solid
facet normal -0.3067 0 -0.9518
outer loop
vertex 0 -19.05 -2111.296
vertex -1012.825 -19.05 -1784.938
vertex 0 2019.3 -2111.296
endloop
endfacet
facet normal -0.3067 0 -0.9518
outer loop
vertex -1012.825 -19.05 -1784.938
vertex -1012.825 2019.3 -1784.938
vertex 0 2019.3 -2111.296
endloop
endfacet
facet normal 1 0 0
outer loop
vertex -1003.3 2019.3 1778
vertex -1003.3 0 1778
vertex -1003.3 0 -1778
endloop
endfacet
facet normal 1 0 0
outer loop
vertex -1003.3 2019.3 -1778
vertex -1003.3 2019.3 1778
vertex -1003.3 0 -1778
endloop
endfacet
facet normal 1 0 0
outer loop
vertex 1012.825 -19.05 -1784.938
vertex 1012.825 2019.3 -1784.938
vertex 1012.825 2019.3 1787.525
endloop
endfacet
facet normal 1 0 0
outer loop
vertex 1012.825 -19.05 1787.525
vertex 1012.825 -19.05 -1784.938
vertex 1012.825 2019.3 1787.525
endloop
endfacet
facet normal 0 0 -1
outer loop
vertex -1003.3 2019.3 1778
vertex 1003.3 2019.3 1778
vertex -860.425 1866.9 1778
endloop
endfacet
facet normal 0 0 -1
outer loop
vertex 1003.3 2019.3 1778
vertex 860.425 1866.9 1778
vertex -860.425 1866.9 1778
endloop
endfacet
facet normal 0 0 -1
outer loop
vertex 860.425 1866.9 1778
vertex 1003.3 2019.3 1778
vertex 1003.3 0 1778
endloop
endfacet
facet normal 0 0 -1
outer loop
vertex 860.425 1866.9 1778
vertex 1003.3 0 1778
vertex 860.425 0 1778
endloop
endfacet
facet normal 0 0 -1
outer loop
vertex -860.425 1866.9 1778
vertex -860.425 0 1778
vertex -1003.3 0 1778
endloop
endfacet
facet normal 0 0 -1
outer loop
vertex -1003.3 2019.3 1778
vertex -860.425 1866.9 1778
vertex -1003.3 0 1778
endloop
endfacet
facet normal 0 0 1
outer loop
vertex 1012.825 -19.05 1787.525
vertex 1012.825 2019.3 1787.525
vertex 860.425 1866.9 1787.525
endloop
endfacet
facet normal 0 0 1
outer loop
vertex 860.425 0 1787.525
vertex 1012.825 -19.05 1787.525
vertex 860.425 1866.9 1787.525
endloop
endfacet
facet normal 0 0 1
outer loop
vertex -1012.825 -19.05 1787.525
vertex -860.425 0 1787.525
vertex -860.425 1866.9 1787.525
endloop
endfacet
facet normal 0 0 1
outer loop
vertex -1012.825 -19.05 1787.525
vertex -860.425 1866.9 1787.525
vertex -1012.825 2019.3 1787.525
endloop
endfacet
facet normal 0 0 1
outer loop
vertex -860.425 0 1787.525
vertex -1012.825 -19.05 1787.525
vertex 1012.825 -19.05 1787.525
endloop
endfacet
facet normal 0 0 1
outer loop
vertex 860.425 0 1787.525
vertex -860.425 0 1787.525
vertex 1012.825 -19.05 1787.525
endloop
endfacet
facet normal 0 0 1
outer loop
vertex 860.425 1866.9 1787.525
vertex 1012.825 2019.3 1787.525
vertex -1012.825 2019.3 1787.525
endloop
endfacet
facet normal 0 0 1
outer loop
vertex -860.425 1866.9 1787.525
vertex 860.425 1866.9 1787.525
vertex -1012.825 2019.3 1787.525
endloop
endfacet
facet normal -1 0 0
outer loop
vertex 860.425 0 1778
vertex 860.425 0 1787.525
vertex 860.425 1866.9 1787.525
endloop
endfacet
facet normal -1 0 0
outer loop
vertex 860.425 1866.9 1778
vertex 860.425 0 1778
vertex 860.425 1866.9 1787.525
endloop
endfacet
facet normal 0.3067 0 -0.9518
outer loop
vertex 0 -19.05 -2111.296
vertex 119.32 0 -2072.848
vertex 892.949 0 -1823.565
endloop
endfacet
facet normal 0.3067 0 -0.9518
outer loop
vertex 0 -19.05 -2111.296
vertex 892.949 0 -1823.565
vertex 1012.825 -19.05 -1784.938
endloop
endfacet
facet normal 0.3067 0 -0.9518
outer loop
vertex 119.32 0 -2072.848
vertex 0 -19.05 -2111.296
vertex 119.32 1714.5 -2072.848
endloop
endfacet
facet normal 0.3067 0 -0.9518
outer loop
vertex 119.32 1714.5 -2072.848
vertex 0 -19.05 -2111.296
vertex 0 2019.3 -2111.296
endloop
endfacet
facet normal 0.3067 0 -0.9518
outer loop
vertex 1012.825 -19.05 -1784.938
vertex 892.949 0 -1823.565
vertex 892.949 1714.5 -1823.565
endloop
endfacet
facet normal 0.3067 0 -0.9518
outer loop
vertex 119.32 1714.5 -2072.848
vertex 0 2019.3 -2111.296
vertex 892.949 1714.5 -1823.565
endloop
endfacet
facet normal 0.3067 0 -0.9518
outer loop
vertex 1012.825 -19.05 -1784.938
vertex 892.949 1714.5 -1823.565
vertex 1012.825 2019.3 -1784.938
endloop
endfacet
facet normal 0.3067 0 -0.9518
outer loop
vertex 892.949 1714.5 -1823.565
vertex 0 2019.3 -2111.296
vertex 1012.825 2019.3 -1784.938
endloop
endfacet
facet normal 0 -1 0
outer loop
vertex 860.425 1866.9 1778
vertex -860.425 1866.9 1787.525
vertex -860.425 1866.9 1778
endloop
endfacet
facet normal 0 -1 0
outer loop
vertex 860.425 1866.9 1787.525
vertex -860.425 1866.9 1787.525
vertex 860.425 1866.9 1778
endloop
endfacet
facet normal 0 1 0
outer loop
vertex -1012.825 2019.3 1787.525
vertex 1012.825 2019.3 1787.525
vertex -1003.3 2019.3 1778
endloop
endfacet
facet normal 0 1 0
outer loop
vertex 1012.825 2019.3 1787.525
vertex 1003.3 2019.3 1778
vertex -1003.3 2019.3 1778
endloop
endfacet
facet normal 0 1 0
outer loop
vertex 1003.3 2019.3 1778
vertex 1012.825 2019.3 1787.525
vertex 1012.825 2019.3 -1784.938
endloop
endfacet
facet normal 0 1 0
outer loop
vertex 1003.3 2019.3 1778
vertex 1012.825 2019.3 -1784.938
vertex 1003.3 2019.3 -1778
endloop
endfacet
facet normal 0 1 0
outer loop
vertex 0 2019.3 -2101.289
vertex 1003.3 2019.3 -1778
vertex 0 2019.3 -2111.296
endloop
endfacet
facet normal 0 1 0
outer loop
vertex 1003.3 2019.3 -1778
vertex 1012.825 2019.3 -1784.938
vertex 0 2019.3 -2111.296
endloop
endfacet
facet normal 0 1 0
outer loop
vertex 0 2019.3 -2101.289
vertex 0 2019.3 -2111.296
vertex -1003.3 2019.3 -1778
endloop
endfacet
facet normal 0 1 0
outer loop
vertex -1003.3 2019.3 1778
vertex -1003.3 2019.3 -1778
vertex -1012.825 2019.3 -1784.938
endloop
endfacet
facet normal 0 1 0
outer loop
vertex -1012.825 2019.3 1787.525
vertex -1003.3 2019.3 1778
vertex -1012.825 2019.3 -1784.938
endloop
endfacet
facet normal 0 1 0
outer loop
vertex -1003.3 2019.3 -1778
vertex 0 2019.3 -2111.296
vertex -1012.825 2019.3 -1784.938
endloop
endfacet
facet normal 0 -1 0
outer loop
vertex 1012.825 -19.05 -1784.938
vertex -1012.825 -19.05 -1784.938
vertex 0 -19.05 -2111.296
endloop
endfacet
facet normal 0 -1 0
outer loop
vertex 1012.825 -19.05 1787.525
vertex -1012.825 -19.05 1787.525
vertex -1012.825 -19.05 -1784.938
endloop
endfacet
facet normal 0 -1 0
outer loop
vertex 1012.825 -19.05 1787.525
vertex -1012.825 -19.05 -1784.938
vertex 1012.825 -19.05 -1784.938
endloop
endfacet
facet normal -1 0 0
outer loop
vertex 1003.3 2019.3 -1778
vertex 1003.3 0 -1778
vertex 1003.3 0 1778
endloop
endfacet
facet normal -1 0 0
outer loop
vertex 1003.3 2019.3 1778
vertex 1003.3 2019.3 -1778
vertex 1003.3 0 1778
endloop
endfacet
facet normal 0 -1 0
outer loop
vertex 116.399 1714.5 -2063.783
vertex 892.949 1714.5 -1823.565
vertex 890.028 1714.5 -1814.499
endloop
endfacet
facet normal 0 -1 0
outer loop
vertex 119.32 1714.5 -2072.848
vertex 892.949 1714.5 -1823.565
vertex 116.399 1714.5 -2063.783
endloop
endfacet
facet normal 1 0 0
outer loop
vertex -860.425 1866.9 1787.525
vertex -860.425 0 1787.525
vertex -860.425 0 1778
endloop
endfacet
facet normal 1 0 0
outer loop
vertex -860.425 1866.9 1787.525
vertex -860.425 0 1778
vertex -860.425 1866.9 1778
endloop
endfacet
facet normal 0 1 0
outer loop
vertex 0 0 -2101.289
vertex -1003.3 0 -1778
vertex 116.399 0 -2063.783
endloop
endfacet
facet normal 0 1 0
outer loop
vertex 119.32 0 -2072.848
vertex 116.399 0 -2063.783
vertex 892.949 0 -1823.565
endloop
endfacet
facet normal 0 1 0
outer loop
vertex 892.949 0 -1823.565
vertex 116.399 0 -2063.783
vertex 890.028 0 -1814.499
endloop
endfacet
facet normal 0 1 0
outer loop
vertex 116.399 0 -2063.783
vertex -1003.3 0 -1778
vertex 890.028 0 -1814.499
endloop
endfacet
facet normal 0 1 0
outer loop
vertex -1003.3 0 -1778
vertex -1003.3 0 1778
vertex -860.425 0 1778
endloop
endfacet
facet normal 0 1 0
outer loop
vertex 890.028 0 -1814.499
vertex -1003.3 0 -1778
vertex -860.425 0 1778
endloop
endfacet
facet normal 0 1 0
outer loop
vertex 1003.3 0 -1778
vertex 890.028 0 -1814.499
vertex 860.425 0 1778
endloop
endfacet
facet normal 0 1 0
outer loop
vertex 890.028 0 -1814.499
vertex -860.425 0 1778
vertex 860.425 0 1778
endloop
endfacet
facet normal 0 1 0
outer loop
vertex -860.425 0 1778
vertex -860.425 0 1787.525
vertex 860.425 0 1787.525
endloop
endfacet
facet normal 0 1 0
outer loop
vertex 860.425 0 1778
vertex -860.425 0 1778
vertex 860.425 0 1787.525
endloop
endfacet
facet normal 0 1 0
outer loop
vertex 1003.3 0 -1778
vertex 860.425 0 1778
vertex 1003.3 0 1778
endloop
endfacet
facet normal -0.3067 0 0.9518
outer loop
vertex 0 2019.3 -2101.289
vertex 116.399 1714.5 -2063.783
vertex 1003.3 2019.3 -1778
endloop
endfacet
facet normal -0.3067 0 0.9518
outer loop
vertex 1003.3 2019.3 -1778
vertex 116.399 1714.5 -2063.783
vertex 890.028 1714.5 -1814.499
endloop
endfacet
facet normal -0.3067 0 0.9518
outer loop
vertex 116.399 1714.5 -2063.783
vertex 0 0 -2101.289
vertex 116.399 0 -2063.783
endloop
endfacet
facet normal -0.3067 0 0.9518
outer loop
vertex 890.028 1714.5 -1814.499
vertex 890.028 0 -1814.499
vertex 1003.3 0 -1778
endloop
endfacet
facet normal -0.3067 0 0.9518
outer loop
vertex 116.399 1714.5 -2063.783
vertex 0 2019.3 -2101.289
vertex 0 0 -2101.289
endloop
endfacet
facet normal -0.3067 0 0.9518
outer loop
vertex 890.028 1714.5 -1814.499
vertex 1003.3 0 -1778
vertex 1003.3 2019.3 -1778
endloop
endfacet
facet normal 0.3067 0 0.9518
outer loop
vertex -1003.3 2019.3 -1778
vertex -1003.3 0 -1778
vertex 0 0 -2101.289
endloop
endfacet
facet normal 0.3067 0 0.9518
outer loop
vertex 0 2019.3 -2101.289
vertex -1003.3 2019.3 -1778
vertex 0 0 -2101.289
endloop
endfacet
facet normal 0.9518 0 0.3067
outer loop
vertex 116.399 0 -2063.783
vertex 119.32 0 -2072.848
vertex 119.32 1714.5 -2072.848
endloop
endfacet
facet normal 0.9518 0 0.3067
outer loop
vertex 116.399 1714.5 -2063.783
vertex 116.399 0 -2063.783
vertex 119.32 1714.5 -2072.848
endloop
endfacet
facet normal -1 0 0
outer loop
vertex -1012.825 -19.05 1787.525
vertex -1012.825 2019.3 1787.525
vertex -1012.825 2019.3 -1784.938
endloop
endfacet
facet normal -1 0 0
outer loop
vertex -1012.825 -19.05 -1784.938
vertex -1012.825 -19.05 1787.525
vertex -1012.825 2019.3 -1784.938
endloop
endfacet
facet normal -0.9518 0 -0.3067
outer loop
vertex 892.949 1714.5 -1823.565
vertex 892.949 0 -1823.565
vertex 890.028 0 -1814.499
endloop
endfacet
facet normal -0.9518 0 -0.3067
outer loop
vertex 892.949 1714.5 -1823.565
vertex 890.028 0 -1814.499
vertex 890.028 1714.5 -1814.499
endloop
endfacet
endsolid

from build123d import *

# Parameters (mm, degrees)
BOSS_EXTRUDE1_DEPTH = 2019.3
BOSS_EXTRUDE2_DEPTH = 19.05
CUT_EXTRUDE1_REACH  = 4023.557
SKETCH3_W           = 812.8
SKETCH3_H           = 1714.5
CUT_EXTRUDE2_REACH  = 3900.821
SKETCH4_W           = 1720.85
SKETCH4_H           = 1866.9


with BuildPart() as part:
    # Sketch1 → Boss-Extrude1 (new body)
    with BuildSketch(Plane(origin=(0, 0, 0), x_dir=(1, 0, 0), z_dir=(0, 1, 0))):
        Polygon((-1012.825, 1784.938077022), (0, 2111.29649884), (1012.825, 1784.938077022), (1012.825, -1787.525), (-1012.825, -1787.525), align=None)
        Polygon((-1003.3, 1778), (0, 2101.289220358), (1003.3, 1778), (1003.3, -1778), (-1003.3, -1778), align=None, mode=Mode.SUBTRACT)
    extrude(amount=BOSS_EXTRUDE1_DEPTH)

    # Sketch2 → Boss-Extrude2 (add)
    with BuildSketch(Plane.XZ):
        Polygon((-1012.825, 1787.525), (-1012.825, -1784.938077022), (0, -2111.29649884), (1012.825, -1784.938077022), (1012.825, 1787.525), align=None)
    extrude(amount=BOSS_EXTRUDE2_DEPTH)

    # Sketch3 → Cut-Extrude1 (cut, up to next)
    with BuildSketch(Plane(origin=(616.321952552, 0, -1912.701618414), x_dir=(-0.951807229, 0, -0.306696917), z_dir=(0.306696917, 0, -0.951807229)), mode=Mode.PRIVATE) as cut_extrude1_sk1:
        with Locations((115.766478733, 857.25)):
            Rectangle(SKETCH3_W, SKETCH3_H)
    cut_extrude1_tool1 = extrude(cut_extrude1_sk1.sketch, amount=-CUT_EXTRUDE1_REACH, mode=Mode.PRIVATE) & part.part
    add(cut_extrude1_tool1.solids().sort_by_distance((506.134581, 857.25, -1948.206841))[0], mode=Mode.SUBTRACT)

    # Sketch4 → Cut-Extrude2 (cut, up to next)
    with BuildSketch(Plane.XY.offset(1787.525), mode=Mode.PRIVATE) as cut_extrude2_sk1:
        with Locations((0, 933.45)):
            Rectangle(SKETCH4_W, SKETCH4_H)
    cut_extrude2_tool1 = extrude(cut_extrude2_sk1.sketch, amount=-CUT_EXTRUDE2_REACH, mode=Mode.PRIVATE) & part.part
    add(cut_extrude2_tool1.solids().sort_by_distance((0, 933.45, 1787.525))[0], mode=Mode.SUBTRACT)


solid = part.part
